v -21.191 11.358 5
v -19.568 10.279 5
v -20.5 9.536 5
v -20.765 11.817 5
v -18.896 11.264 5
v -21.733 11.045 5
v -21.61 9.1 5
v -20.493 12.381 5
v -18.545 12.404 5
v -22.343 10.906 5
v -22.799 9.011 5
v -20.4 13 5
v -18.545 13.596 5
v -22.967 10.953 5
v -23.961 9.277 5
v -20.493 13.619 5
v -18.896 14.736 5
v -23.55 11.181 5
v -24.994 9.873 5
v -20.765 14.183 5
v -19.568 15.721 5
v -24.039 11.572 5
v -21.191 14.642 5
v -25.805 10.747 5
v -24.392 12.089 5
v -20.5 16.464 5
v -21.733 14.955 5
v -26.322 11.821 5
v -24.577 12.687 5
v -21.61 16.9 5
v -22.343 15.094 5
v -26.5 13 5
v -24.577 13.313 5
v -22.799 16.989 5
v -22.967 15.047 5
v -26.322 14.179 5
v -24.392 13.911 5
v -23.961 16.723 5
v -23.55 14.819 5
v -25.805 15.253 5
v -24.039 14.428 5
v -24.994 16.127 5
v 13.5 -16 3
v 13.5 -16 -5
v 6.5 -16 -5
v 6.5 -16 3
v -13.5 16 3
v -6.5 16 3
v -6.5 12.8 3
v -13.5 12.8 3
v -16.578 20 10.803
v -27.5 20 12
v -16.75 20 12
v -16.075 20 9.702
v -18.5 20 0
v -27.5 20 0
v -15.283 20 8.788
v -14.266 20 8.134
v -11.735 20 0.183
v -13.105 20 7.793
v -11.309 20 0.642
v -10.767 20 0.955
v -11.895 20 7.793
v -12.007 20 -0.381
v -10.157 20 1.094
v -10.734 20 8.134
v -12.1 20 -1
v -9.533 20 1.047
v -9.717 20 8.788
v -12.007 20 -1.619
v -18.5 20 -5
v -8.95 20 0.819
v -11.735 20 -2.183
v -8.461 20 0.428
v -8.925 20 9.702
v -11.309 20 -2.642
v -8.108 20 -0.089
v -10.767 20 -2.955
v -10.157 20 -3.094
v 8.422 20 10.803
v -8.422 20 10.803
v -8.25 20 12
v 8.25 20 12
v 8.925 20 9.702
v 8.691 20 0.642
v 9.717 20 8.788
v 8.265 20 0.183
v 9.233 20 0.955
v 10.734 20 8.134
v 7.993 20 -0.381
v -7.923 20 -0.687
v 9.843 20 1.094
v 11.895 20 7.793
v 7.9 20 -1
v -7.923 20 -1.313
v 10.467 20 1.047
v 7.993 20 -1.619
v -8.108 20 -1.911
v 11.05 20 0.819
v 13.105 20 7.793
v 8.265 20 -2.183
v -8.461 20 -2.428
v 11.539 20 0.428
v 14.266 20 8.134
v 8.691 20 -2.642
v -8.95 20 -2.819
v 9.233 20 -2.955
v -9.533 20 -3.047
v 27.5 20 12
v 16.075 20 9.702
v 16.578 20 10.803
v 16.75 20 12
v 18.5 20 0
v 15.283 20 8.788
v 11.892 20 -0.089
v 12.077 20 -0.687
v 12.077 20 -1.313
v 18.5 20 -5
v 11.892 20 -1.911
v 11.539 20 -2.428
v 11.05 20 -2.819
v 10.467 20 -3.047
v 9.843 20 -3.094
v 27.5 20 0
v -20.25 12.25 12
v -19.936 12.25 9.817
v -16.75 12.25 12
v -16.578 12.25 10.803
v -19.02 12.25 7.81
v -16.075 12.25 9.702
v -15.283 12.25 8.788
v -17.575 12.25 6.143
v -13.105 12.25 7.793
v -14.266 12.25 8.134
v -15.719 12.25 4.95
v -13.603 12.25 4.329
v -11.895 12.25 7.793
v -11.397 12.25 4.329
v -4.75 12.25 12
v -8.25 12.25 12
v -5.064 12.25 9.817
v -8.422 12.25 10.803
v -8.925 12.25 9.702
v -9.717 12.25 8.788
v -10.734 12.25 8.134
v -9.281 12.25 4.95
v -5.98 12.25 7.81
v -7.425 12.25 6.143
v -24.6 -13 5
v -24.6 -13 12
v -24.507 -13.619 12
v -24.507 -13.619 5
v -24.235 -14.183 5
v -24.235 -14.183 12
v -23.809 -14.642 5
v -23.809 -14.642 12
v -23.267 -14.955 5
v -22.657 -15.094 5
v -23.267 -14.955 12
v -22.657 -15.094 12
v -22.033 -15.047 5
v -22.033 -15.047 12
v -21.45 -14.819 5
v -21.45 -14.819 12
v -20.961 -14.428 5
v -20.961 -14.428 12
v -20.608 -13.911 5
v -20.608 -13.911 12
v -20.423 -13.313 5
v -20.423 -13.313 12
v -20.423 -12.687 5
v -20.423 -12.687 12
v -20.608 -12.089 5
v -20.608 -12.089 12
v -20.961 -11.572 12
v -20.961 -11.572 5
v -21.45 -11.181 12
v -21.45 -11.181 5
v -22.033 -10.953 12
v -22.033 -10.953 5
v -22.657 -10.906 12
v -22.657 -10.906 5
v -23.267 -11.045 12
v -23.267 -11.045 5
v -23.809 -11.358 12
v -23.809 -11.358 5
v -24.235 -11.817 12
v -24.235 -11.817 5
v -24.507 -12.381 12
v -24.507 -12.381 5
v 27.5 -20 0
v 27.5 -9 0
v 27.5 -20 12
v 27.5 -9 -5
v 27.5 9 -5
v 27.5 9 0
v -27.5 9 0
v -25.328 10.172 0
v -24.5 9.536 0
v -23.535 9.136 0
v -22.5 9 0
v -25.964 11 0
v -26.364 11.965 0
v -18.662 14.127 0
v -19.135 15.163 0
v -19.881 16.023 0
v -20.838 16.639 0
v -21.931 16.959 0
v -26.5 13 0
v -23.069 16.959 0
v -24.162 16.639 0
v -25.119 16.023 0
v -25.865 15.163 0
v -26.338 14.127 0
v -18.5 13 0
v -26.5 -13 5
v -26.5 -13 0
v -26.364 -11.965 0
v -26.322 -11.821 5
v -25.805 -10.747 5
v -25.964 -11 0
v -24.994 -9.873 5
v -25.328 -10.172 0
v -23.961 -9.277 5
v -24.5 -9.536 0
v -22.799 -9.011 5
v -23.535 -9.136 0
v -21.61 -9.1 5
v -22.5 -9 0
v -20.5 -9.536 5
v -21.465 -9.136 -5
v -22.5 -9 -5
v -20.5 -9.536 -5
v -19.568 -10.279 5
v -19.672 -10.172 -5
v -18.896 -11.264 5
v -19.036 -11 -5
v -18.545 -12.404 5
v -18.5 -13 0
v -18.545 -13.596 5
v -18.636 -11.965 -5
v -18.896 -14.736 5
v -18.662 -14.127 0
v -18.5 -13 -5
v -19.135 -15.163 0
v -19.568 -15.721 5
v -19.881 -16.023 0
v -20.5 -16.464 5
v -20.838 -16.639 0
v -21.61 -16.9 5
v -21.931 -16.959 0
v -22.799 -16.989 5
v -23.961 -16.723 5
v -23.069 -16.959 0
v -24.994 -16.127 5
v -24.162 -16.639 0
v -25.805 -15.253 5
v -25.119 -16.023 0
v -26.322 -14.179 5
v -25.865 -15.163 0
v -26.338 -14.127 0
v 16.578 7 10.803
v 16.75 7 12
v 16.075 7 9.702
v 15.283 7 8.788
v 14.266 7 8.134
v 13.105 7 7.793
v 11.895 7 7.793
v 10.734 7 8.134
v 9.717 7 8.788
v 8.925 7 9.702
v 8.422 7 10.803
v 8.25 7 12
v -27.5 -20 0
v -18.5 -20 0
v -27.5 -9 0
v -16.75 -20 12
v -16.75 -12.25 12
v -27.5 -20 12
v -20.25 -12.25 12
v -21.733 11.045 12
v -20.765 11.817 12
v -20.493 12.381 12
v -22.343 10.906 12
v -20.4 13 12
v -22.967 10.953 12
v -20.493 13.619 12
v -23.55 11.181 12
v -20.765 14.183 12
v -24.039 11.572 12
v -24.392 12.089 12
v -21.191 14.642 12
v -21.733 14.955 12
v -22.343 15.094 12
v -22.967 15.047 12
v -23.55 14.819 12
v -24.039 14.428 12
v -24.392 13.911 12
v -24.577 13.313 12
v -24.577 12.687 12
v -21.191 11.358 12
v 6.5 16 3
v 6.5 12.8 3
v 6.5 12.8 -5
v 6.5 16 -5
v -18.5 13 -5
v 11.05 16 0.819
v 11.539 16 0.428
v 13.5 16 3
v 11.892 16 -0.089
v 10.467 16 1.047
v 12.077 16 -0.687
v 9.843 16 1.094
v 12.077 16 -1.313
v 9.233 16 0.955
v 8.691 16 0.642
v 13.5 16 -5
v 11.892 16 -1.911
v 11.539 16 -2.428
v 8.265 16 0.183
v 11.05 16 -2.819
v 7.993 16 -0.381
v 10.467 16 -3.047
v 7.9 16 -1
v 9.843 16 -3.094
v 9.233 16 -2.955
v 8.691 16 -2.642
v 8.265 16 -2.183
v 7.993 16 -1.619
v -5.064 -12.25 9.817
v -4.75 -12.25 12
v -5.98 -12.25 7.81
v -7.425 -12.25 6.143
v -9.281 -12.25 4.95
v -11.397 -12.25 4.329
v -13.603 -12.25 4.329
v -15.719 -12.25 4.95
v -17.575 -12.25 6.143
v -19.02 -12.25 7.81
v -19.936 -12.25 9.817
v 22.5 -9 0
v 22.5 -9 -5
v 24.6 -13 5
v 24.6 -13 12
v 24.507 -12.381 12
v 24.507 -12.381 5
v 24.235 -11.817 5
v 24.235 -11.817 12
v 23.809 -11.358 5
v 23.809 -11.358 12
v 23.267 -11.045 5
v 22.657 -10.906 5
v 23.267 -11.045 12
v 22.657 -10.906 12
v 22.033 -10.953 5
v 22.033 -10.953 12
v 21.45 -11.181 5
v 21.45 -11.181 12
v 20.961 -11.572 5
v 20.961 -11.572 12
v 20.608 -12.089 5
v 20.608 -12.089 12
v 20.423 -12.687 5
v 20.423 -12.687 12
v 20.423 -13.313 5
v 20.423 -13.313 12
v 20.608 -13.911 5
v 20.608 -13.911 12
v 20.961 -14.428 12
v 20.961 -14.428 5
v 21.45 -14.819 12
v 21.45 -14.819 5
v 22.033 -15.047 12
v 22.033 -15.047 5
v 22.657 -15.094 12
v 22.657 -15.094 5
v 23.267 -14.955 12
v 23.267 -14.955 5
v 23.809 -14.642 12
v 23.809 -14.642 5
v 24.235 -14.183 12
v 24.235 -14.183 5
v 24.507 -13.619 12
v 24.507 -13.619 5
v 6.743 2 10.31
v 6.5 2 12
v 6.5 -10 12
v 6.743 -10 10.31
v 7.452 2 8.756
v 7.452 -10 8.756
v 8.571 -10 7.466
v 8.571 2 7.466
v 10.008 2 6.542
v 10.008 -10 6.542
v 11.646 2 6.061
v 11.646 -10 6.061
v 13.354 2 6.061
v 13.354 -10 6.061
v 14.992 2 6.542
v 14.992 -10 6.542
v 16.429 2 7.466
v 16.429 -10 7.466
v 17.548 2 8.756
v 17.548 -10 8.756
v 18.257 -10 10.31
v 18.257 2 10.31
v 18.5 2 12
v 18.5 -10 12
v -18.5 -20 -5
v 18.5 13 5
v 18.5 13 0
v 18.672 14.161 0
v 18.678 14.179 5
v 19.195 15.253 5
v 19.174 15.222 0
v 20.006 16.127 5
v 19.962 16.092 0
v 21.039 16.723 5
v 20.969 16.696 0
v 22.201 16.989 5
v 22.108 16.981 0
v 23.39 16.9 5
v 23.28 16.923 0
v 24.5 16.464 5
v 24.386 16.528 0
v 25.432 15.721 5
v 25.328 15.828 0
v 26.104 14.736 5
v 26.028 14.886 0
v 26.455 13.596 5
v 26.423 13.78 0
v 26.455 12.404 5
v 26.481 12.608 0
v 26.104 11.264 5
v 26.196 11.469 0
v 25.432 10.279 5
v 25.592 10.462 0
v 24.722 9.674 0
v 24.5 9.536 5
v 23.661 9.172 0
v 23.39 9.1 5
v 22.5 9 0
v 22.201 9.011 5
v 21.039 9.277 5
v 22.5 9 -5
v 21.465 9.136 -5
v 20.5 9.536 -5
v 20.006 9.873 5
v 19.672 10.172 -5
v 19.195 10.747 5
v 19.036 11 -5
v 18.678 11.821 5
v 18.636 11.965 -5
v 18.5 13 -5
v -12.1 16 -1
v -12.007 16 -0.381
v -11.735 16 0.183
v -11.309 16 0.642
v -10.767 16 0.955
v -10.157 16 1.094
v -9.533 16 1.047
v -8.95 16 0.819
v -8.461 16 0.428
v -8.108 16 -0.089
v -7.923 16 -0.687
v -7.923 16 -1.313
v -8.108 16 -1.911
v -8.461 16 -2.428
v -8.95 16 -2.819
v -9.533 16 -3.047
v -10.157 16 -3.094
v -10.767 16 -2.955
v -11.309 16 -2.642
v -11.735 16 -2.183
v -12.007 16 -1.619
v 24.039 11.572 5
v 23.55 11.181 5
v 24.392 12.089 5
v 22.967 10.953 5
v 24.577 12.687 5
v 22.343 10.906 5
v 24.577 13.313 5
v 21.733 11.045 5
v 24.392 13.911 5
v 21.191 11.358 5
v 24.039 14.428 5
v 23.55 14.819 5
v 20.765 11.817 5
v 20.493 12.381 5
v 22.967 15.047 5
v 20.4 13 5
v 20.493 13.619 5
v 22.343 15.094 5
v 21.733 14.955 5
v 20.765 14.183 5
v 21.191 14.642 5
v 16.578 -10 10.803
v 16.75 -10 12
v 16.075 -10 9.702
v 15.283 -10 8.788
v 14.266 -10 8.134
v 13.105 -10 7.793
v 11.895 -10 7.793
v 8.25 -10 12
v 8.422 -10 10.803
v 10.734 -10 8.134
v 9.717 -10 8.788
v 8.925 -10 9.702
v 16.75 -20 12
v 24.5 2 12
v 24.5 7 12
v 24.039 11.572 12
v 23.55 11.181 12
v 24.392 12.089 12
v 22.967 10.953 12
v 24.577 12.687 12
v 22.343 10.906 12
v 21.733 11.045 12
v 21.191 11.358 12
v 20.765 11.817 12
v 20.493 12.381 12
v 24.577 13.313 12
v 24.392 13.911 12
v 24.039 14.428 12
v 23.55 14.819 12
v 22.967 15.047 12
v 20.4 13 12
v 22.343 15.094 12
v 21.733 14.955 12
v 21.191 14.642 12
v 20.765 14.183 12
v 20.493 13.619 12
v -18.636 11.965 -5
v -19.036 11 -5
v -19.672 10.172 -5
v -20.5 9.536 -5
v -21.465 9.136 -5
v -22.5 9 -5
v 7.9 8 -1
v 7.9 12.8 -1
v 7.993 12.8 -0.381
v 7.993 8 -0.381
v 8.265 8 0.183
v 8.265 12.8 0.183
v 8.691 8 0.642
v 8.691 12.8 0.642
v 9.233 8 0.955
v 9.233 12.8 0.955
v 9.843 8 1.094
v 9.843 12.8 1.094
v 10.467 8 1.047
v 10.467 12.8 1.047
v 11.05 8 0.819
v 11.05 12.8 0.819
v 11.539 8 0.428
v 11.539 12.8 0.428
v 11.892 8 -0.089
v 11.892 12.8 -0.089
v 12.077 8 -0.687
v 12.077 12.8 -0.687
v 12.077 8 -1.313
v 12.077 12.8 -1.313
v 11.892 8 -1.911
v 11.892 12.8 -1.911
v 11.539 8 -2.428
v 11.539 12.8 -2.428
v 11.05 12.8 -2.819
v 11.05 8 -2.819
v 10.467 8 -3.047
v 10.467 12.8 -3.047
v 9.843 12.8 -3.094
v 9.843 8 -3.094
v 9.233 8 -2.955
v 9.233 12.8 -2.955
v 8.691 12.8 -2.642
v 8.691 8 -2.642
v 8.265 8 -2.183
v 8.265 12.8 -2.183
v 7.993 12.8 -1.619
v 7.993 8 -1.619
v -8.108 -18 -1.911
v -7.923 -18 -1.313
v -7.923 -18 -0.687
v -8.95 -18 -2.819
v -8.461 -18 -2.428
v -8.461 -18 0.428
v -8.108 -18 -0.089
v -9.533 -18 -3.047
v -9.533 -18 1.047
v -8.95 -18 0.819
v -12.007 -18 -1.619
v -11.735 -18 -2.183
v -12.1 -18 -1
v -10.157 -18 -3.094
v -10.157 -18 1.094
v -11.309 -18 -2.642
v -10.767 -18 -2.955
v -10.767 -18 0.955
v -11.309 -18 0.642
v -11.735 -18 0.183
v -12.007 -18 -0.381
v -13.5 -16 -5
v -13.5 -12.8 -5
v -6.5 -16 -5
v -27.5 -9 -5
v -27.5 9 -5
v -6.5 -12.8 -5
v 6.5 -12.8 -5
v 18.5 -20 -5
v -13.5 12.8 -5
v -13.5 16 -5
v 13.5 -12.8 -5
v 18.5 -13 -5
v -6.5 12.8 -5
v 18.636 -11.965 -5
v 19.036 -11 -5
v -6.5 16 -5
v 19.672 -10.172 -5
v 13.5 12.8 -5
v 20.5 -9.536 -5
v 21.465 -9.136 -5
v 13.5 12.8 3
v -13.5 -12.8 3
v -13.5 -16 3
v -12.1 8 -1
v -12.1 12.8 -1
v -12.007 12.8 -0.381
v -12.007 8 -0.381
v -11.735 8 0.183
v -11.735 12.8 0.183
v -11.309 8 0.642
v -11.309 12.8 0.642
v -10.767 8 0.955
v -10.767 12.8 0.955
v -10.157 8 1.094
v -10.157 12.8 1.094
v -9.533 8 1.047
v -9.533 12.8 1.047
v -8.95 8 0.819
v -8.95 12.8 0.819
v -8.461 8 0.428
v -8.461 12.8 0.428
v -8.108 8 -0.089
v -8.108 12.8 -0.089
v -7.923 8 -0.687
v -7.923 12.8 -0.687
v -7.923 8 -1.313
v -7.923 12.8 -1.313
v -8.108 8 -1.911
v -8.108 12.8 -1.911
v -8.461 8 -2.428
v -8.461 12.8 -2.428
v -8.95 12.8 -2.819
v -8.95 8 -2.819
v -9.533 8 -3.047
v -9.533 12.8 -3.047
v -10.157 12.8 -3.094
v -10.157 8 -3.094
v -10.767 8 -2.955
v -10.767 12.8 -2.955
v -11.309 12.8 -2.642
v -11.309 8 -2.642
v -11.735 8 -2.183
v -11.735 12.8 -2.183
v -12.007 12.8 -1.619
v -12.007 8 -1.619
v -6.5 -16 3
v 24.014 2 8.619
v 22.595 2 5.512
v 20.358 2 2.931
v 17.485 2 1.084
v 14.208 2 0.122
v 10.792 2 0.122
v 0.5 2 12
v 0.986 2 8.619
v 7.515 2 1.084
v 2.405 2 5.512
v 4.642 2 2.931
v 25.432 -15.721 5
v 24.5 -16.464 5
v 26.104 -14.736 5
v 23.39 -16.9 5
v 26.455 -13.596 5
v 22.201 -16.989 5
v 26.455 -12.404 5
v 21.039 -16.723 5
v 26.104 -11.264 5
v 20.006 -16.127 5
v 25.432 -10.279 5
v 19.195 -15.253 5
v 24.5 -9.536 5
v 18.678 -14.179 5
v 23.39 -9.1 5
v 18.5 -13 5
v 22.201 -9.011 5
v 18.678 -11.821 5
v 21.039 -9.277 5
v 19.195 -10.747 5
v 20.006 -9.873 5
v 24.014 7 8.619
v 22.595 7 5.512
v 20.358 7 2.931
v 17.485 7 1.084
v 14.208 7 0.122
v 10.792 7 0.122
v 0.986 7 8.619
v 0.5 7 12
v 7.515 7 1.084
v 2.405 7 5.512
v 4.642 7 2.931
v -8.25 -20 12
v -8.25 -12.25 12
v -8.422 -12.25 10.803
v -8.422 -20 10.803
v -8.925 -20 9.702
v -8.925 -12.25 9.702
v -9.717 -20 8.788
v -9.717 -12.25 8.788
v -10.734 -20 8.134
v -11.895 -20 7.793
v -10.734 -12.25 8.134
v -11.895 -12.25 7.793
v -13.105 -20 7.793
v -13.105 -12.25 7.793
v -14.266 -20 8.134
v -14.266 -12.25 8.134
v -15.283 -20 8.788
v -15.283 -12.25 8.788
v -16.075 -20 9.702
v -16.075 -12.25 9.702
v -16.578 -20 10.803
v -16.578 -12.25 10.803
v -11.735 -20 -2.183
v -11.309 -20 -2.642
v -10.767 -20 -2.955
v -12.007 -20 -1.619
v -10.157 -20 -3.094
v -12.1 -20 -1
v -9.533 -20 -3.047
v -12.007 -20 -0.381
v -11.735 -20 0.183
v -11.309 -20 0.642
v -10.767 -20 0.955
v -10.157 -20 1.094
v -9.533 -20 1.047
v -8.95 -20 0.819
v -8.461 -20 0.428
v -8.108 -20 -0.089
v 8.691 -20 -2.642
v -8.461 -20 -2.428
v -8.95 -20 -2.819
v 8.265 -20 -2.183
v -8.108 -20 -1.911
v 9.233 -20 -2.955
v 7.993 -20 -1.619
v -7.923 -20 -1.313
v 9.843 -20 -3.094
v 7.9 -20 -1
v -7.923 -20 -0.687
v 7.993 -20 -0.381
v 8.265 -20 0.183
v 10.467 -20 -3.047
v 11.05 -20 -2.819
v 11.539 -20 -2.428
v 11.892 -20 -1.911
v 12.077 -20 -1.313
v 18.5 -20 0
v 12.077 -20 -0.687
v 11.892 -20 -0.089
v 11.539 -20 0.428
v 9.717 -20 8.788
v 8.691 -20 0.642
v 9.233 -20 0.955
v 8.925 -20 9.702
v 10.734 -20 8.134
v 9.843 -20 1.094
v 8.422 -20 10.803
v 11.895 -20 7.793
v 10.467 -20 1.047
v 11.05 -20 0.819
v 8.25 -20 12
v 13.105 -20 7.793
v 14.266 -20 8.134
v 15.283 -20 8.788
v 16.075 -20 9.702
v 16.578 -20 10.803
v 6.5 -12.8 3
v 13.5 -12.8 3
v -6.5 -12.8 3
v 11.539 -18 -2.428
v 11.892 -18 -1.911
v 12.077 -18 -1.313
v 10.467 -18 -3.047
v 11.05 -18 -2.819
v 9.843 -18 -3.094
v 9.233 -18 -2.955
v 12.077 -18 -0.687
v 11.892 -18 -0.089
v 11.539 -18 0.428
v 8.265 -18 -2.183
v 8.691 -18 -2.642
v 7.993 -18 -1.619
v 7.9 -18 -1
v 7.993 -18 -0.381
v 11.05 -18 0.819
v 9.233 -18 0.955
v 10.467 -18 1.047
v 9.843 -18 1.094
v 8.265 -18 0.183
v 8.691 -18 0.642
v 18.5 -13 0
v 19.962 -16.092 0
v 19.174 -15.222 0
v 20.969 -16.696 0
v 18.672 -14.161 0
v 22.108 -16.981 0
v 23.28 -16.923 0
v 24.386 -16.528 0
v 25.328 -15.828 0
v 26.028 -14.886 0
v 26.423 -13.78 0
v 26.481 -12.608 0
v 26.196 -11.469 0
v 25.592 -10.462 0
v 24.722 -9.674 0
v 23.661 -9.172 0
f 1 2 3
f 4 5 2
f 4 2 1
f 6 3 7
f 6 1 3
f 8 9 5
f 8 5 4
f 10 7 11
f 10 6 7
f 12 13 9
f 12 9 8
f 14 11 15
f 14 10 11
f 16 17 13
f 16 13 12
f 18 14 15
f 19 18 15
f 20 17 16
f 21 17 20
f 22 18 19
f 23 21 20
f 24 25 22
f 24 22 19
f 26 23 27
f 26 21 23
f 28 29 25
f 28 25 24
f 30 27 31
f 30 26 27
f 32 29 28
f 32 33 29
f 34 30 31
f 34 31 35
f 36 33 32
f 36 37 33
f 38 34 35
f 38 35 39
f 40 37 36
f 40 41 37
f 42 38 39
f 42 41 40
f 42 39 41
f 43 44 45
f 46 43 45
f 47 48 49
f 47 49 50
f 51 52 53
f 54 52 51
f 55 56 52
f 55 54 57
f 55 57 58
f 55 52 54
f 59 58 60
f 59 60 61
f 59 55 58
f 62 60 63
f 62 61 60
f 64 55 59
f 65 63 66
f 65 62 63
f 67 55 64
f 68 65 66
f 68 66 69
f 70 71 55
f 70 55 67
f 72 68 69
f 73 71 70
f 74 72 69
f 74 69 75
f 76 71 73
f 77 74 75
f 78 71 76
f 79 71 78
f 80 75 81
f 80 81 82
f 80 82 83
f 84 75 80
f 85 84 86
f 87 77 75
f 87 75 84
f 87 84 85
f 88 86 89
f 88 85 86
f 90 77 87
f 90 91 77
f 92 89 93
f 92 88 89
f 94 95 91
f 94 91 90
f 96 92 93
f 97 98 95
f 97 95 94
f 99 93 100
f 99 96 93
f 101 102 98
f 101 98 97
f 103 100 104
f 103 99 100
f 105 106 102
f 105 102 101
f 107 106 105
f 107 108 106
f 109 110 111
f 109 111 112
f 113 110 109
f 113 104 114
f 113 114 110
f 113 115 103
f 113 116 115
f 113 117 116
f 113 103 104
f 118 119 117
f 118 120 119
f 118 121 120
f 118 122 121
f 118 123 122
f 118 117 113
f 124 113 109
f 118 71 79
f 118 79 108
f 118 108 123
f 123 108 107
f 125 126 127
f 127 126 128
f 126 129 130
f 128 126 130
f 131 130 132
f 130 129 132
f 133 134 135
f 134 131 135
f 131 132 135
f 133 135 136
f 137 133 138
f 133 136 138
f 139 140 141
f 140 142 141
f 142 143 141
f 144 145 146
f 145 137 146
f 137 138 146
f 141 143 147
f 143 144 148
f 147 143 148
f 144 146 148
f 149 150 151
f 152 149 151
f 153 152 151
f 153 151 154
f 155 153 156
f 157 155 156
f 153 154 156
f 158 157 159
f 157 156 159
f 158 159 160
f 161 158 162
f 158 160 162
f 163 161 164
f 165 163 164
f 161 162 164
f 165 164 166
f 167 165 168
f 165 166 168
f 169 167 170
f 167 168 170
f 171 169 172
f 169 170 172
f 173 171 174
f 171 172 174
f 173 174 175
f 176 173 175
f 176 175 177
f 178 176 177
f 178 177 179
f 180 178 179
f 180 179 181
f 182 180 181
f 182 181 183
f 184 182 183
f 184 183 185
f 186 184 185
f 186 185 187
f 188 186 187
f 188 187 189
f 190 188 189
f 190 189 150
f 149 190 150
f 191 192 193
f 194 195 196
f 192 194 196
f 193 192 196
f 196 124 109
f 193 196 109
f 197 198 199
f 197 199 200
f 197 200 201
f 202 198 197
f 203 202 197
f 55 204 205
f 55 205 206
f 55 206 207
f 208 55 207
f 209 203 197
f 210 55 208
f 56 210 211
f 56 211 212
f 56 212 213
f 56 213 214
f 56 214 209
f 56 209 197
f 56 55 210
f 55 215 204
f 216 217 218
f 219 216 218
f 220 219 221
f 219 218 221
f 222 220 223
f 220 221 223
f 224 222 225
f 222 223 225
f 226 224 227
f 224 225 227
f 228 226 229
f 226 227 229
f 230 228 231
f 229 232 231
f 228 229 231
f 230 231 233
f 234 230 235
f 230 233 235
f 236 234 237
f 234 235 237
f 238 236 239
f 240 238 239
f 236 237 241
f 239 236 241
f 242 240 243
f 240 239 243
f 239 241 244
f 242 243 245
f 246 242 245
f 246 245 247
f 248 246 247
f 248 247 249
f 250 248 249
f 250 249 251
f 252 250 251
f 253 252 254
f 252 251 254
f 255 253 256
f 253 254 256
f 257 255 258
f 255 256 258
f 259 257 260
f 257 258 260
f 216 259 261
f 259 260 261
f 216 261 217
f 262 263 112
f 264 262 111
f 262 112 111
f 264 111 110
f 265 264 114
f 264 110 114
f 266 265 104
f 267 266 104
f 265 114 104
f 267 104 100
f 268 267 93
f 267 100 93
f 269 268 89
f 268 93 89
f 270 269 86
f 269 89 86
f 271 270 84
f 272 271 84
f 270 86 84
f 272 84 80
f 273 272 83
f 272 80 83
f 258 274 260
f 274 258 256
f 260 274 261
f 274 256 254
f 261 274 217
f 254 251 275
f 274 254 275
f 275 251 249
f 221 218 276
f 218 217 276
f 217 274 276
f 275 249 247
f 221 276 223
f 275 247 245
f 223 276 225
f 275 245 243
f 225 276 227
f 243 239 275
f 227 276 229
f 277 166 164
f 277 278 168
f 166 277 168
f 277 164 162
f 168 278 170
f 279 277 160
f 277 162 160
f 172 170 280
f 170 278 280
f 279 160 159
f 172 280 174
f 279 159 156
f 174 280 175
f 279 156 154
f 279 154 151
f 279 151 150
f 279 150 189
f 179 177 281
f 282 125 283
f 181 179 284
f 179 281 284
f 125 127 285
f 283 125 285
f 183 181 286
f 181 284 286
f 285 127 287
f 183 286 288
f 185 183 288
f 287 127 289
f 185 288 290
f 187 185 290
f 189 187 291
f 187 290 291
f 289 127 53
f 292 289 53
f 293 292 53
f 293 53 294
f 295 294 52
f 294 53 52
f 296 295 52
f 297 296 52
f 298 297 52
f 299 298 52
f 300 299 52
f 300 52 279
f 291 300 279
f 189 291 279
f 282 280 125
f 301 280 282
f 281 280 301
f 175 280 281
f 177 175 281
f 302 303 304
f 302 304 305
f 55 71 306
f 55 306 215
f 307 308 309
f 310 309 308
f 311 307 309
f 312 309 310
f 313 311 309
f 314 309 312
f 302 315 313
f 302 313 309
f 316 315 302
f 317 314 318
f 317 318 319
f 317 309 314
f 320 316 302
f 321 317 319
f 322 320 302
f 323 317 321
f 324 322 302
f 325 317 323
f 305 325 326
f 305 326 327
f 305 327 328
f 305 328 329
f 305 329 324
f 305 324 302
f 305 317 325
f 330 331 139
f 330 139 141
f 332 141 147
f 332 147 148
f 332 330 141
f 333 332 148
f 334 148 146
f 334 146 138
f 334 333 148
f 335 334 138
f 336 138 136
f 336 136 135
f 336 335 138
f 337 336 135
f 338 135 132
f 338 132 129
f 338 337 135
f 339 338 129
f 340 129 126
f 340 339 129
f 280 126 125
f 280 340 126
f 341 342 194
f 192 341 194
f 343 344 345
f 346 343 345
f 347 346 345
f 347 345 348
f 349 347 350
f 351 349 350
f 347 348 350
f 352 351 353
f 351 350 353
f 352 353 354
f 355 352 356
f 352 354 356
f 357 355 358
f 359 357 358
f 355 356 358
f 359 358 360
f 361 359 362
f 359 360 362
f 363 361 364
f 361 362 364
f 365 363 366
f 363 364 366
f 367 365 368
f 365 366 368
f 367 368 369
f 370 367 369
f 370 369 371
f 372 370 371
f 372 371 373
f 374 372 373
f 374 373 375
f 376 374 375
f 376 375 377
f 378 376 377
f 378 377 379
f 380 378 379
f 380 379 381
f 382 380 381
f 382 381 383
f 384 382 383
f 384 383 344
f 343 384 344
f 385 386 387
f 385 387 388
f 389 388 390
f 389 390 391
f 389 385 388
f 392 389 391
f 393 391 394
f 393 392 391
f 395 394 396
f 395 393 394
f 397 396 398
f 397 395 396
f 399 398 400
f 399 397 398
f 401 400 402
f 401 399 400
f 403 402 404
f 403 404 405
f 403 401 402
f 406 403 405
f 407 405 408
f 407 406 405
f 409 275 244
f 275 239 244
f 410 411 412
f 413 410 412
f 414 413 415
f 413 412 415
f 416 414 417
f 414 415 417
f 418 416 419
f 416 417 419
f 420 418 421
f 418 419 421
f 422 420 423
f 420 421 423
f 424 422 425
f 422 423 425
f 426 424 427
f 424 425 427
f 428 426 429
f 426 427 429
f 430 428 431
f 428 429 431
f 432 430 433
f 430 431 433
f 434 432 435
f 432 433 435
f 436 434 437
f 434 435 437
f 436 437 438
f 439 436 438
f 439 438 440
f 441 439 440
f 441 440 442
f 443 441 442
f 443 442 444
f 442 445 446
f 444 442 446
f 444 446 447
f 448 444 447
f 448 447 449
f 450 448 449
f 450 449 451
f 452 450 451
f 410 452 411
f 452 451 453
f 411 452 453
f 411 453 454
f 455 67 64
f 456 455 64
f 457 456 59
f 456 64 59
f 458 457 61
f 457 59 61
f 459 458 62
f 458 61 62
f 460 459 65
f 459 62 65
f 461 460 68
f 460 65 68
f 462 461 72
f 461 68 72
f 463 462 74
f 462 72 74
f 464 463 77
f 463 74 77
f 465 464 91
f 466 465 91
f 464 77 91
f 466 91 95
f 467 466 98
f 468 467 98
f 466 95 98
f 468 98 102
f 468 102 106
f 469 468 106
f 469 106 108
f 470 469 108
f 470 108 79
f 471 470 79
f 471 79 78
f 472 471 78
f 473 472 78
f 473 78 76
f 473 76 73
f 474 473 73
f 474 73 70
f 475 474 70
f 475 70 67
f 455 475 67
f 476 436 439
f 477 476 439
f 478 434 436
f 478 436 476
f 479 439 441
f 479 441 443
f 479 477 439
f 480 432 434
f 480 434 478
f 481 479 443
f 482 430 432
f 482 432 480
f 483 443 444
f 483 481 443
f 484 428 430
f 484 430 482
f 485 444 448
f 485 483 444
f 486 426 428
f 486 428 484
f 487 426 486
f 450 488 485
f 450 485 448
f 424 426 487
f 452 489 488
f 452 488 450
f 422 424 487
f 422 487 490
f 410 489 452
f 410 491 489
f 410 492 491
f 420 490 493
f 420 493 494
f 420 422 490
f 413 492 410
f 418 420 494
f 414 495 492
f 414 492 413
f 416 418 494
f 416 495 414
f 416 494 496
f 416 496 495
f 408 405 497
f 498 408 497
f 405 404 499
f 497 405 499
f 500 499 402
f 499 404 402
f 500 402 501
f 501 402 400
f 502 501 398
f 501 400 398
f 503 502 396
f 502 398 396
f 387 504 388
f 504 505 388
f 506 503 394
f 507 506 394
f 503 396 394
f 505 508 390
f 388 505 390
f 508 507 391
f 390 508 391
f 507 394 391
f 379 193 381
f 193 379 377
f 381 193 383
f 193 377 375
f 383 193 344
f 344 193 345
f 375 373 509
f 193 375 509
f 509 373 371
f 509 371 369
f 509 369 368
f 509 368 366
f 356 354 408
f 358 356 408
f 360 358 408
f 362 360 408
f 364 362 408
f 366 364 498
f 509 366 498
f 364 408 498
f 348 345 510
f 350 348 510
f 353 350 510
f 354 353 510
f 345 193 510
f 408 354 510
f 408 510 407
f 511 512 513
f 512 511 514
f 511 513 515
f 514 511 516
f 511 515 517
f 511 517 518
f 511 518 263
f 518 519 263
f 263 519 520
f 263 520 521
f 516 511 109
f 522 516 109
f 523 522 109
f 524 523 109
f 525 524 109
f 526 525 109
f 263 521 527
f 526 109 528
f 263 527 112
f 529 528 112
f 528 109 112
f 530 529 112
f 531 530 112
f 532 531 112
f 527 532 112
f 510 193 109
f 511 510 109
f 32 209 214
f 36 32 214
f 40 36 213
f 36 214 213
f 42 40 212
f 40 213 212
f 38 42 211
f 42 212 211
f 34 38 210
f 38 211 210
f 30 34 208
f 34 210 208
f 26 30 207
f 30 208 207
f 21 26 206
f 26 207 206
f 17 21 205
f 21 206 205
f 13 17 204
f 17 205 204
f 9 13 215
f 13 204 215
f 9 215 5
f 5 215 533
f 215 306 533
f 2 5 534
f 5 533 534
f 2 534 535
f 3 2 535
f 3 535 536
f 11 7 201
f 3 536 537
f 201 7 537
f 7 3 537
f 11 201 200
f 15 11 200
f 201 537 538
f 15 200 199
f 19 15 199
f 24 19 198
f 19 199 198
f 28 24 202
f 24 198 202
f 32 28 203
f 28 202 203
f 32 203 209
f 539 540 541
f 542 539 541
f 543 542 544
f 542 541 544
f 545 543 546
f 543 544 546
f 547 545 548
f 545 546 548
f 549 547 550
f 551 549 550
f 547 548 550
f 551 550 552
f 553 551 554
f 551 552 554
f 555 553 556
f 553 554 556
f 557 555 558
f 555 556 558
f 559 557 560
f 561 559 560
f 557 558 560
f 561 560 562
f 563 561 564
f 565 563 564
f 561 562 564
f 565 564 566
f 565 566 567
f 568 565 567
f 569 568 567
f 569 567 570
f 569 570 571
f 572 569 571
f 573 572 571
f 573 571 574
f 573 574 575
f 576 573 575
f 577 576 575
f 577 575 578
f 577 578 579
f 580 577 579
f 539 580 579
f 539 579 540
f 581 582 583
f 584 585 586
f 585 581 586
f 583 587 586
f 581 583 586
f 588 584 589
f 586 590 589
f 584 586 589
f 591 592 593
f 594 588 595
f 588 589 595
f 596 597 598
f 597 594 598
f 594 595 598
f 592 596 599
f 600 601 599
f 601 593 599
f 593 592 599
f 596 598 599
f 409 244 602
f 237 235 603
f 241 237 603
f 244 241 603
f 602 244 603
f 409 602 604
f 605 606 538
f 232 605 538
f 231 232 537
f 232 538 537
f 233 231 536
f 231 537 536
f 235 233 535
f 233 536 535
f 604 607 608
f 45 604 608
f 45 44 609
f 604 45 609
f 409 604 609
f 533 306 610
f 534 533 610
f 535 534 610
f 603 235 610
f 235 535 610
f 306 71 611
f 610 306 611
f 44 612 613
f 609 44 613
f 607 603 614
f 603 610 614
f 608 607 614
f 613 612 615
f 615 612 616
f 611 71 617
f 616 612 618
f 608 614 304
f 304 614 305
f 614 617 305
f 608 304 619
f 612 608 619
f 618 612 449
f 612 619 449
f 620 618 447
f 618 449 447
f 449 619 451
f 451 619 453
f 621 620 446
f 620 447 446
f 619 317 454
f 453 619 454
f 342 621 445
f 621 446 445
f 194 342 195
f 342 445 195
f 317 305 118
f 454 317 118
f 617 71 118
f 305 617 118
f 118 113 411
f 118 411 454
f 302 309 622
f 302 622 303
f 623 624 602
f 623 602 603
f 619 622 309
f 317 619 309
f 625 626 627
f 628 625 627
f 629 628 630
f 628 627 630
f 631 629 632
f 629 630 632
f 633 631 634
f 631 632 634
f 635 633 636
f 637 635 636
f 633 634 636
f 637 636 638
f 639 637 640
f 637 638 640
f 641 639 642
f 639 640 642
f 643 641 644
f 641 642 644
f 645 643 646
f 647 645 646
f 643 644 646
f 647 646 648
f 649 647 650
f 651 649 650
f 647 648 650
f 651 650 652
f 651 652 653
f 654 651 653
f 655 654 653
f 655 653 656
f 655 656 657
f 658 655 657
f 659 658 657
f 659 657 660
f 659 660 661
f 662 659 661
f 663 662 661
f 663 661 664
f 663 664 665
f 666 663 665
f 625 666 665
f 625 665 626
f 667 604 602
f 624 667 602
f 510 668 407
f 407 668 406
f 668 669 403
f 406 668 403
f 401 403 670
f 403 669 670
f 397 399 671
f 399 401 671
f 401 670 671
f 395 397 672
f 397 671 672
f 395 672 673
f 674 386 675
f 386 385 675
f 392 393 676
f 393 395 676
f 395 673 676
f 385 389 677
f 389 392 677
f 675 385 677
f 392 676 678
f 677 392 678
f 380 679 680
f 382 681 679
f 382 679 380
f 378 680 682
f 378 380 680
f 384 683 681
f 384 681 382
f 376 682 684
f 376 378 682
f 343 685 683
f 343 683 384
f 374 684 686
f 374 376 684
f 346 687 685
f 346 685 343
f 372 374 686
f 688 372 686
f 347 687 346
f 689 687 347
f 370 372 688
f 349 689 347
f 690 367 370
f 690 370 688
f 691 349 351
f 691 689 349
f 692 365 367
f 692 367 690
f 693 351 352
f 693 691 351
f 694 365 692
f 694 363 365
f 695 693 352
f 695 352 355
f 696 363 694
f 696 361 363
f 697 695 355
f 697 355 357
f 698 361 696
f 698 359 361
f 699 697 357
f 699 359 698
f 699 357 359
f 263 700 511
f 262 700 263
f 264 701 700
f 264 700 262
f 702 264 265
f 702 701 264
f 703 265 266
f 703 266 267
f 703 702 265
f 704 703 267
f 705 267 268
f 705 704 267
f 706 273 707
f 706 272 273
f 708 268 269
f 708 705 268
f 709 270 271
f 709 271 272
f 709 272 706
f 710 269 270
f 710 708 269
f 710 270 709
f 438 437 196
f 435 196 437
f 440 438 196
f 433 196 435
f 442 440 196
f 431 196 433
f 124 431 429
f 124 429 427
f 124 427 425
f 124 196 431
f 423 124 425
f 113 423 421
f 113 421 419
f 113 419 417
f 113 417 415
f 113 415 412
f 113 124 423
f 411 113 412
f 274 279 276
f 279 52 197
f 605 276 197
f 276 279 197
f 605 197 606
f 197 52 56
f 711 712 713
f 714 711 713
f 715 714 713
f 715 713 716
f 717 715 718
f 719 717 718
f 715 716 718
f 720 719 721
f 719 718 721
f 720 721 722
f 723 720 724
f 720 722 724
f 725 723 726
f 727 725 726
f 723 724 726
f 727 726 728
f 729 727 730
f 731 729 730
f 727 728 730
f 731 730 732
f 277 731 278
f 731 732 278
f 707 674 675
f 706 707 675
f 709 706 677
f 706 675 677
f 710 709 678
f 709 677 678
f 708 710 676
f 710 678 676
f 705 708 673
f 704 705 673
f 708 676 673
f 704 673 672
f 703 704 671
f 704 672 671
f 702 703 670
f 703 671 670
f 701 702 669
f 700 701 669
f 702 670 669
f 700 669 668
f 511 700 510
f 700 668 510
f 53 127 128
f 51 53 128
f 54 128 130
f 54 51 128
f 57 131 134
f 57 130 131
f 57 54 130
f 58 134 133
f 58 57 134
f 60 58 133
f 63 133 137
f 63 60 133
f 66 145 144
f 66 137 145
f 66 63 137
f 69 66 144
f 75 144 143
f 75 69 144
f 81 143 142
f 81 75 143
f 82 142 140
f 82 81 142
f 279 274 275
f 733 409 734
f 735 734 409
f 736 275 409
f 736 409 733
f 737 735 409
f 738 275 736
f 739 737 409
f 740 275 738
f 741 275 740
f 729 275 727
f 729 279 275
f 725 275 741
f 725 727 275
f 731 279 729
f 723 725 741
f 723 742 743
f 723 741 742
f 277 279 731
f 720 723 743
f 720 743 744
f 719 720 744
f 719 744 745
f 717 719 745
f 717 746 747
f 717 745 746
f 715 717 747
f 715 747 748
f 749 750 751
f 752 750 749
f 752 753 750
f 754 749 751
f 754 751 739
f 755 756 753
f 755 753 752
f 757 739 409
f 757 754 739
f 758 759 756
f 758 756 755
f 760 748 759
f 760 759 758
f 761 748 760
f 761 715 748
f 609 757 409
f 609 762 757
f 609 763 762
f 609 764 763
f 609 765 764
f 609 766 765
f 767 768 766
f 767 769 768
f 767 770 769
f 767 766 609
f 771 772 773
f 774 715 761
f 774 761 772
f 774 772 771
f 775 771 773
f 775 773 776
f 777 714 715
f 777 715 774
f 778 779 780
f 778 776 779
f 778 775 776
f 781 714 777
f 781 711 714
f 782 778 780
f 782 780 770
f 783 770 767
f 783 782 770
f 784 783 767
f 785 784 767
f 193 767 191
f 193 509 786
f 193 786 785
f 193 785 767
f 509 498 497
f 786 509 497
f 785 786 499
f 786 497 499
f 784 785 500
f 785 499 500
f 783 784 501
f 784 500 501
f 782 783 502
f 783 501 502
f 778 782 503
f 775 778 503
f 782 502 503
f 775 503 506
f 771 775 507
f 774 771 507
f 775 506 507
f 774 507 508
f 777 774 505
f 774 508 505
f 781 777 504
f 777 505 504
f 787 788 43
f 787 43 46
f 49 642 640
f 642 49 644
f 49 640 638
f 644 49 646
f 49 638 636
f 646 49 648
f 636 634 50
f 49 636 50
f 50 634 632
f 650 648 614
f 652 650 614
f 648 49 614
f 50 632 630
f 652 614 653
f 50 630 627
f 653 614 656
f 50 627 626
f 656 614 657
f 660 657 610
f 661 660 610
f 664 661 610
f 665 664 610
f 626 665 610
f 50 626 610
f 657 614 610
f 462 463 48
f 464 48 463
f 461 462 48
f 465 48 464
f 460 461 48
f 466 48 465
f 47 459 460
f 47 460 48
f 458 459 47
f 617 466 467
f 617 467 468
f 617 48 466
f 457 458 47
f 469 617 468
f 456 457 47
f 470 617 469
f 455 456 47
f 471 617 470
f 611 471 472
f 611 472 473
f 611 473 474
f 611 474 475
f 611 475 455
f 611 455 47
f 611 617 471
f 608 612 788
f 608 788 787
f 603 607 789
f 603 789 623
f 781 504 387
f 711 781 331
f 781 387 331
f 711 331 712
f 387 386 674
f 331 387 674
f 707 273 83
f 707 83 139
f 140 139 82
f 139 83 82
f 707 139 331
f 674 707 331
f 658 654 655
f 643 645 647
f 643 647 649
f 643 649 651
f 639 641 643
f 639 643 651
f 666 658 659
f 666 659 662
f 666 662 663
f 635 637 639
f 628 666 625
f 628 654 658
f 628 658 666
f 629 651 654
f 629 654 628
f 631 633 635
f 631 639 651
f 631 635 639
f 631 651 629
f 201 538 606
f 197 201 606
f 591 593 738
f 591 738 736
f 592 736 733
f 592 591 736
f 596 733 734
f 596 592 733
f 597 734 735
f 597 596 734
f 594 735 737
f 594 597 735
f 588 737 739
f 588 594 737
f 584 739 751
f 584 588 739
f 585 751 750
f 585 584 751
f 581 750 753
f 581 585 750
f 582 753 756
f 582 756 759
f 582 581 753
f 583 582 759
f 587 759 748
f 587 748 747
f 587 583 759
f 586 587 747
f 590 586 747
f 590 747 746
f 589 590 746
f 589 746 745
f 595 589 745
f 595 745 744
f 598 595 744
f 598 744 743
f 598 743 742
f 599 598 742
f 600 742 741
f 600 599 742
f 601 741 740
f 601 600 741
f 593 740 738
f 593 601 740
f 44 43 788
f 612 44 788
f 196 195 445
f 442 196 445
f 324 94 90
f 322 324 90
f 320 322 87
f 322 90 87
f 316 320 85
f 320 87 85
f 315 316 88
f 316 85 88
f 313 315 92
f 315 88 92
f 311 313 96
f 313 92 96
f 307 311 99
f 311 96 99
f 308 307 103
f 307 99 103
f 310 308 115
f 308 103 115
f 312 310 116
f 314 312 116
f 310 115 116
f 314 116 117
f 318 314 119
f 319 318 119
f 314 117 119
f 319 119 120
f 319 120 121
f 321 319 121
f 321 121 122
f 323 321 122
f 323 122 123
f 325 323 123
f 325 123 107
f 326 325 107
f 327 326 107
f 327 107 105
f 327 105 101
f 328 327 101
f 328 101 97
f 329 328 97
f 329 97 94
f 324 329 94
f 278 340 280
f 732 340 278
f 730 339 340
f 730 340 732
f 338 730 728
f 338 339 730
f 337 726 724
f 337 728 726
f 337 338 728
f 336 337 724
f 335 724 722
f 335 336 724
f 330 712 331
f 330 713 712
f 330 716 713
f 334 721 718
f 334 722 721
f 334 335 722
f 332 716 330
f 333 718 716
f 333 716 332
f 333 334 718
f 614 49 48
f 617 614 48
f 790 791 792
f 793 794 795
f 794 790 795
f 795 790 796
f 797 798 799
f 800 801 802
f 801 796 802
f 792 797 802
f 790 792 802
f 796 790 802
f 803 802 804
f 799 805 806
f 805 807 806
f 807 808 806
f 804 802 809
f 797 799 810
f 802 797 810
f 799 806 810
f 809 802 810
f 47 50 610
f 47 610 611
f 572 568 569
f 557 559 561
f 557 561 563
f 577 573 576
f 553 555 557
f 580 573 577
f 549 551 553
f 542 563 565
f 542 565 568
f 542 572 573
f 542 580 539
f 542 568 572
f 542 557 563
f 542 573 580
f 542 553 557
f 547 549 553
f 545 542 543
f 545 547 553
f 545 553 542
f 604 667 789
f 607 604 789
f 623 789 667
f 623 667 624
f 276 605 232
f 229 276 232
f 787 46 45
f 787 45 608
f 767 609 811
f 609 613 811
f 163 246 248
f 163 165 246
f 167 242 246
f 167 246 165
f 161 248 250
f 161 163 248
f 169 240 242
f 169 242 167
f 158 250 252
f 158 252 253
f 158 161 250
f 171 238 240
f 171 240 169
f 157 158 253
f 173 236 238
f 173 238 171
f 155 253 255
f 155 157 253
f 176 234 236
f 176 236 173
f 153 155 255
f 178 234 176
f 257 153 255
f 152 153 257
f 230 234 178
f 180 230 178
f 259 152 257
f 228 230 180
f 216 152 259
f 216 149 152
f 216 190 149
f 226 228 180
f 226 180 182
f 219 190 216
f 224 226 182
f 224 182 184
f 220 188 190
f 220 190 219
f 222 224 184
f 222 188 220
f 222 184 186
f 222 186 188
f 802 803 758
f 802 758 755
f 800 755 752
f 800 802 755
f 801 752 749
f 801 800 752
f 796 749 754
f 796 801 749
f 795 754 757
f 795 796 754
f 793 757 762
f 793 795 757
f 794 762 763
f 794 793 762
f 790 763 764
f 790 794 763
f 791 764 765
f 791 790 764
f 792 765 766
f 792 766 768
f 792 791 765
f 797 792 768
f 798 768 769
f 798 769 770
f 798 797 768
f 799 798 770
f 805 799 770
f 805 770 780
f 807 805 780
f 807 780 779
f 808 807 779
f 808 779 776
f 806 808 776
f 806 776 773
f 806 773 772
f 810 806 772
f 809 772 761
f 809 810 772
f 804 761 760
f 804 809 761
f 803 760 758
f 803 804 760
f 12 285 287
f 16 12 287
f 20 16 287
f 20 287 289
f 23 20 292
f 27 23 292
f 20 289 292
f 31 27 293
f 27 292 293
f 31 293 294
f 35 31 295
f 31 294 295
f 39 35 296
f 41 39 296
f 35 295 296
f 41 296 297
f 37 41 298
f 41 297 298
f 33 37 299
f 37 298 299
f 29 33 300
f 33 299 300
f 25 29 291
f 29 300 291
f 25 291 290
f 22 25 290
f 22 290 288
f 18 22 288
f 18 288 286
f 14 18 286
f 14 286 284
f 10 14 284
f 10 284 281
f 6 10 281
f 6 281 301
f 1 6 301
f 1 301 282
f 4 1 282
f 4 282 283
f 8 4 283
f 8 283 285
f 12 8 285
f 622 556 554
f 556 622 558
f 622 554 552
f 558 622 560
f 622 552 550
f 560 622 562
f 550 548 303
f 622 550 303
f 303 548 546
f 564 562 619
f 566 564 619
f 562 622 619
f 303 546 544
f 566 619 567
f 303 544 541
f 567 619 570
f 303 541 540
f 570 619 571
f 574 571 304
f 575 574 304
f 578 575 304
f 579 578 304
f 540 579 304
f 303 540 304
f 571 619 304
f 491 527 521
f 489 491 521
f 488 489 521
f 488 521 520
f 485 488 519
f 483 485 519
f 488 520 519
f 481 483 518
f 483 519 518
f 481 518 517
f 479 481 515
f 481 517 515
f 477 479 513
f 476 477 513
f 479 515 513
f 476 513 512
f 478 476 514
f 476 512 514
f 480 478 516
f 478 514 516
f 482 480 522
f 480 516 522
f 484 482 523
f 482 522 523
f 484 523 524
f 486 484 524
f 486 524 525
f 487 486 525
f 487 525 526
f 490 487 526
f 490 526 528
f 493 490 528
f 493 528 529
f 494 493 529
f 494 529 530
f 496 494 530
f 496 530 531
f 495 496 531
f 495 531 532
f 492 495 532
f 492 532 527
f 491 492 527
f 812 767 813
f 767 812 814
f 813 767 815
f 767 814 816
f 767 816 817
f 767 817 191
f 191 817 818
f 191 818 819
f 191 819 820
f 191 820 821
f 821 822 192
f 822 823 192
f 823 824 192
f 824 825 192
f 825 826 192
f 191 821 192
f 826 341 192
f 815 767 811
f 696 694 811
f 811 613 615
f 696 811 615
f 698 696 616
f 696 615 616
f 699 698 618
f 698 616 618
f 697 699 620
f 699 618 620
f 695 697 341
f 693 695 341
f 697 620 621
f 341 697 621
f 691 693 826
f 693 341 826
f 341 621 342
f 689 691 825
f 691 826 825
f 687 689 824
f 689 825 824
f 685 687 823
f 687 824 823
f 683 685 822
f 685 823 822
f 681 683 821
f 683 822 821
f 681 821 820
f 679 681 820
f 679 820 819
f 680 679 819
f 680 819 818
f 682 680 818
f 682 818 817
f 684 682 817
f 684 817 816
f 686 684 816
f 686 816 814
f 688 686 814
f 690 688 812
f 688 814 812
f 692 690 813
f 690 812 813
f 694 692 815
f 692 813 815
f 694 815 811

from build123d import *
from build123d.topology import SkipClean

# Parameters (mm, degrees)
ESQUISSE1_W                  = 55
ESQUISSE1_H                  = 45
BOSS_EXTRU_1_DEPTH           = 12
ESQUISSE2_R                  = 4.25
ENL_V_MAT_EXTRU_1_DEPTH      = 55.085580333
ENL_V_MAT_EXTRU_2_DEPTH      = 12.25
ENL_V_MAT_EXTRU_2_DEPTH_BACK = 12.25
ESQUISSE3_R                  = 7.75
ESQUISSE9_W                  = 61.062756781
ESQUISSE9_H                  = 12.22812859
ESQUISSE9_W_2                = 59.427147224
ESQUISSE9_H_2                = 8.100161614
ENL_V_MAT_EXTRU_7_DEPTH      = 31
SKETCH1_W                    = 55
SKETCH1_H                    = 36
BOSS_EXTRUDE1_DEPTH          = 5
SKETCH2_R                    = 2.1
CUT_EXTRUDE1_DEPTH           = 38.003378224
SKETCH3_R                    = 4
CUT_EXTRUDE2_DEPTH           = 10
CUT_EXTRUDE3_DEPTH           = 5
SKETCH5_R                    = 2.1
CUT_EXTRUDE4_DEPTH           = 10
BOSS_EXTRUDE4_START          = 2
SKETCH7_R                    = 2.1
BOSS_EXTRUDE4_DEPTH          = 2
SKETCH8_R                    = 2.1
BOSS_EXTRUDE5_DEPTH          = 2
SKETCH9_W                    = 7
SKETCH9_H                    = 3.2
CUT_EXTRUDE6_DEPTH           = 8
ESQUISSE12_R                 = 6
ENL_V_MAT_EXTRU_9_DEPTH      = 12
ESQUISSE13_R                 = 12
ENL_V_MAT_EXTRU_10_DEPTH     = 5


with BuildPart() as part:
    # Esquisse1 → Boss.-Extru.1 (new body)
    with BuildSketch(Plane.XY):
        Rectangle(ESQUISSE1_W, ESQUISSE1_H)
    extrude(amount=BOSS_EXTRU_1_DEPTH)

    # Esquisse2 → Enlèv. mat.-Extru.1 (cut, through all)
    with BuildSketch(Plane(origin=(0, 22.5, 0), x_dir=(1, 0, 0), z_dir=(0, 1, 0))):
        with Locations((-12.5, -12)):
            Circle(ESQUISSE2_R)
        with Locations((12.5, -12)):
            Circle(ESQUISSE2_R)
    extrude(amount=-ENL_V_MAT_EXTRU_1_DEPTH, mode=Mode.SUBTRACT)

    # Esquisse3 → Enlèv. mat.-Extru.2 (cut, two sides: drawn at the far end of the back side and taken through both)
    with BuildSketch(Plane(origin=(0, 0, 0), x_dir=(1, 0, 0), z_dir=(0, 1, 0)).offset(-ENL_V_MAT_EXTRU_2_DEPTH_BACK)):
        with Locations((-12.5, -12)):
            Circle(ESQUISSE3_R)
    extrude(amount=ENL_V_MAT_EXTRU_2_DEPTH + ENL_V_MAT_EXTRU_2_DEPTH_BACK, mode=Mode.SUBTRACT)

    # Esquisse9 → Enlèv. mat.-Extru.7 (cut)
    with BuildSketch(Plane.XY.offset(12)):
        with Locations((-0.389430846, -24.114064295)):
            Rectangle(ESQUISSE9_W, ESQUISSE9_H)
        with Locations((1.674552641, 22.050080807)):
            Rectangle(ESQUISSE9_W_2, ESQUISSE9_H_2)
    extrude(amount=-ENL_V_MAT_EXTRU_7_DEPTH, mode=Mode.SUBTRACT)

    # Sketch1 → Boss-Extrude1 (add)
    with BuildSketch(Plane(origin=(0, 0, 0), x_dir=(-1, 0, 0), z_dir=(0, 0, -1))):
        Rectangle(SKETCH1_W, SKETCH1_H)
    extrude(amount=BOSS_EXTRUDE1_DEPTH)

    # Sketch2 → Cut-Extrude1 (cut, through all)
    with BuildSketch(Plane.XY.offset(12)):
        with Locations((-22.5, 13)):
            Circle(SKETCH2_R)
        with Locations((22.5, 13)):
            Circle(SKETCH2_R)
        with Locations((22.5, -13)):
            Circle(SKETCH2_R)
        with Locations((-22.5, -13)):
            Circle(SKETCH2_R)
    extrude(amount=-CUT_EXTRUDE1_DEPTH, mode=Mode.SUBTRACT)

    # Sketch3 → Cut-Extrude2 (cut)
    with BuildSketch(Plane(origin=(0, 0, -5), x_dir=(-1, 0, 0), z_dir=(0, 0, -1))):
        with Locations((-22.5, 13)):
            Circle(SKETCH3_R)
        with Locations((22.5, 13)):
            Circle(SKETCH3_R)
        with Locations((22.5, -13)):
            Circle(SKETCH3_R)
        with Locations((-22.5, -13)):
            Circle(SKETCH3_R)
    extrude(amount=-CUT_EXTRUDE2_DEPTH, mode=Mode.SUBTRACT)

    # Sketch4 → Cut-Extrude3 (cut)
    with BuildSketch(Plane(origin=(0, 0, -5), x_dir=(-1, 0, 0), z_dir=(0, 0, -1))):
        with BuildLine():
            Line((-18.5, 13), (-18.5, 18))
            Line((-18.5, 18), (-27.5, 18))
            Line((-27.5, 18), (-27.5, 9))
            Line((-27.5, 9), (-22.5, 9))
            ThreePointArc((-22.5, 9), (-25.328427125, 15.828427125), (-18.5, 13))
        make_face()
        with BuildLine():
            Line((-22.5, -9), (-27.5, -9))
            Line((-27.5, -9), (-27.5, -18))
            Line((-27.5, -18), (-18.5, -18))
            Line((-18.5, -18), (-18.5, -13))
            ThreePointArc((-18.5, -13), (-25.328427125, -15.828427125), (-22.5, -9))
        make_face()
        with BuildLine():
            Line((27.5, -18), (27.5, -9))
            Line((27.5, -9), (22.5, -9))
            ThreePointArc((22.5, -9), (25.328427125, -15.828427125), (18.5, -13))
            Line((18.5, -13), (18.5, -18))
            Line((18.5, -18), (27.5, -18))
        make_face()
        with BuildLine():
            Line((27.5, 18), (18.5, 18))
            Line((18.5, 18), (18.5, 13))
            ThreePointArc((18.5, 13), (25.328427125, 15.828427125), (22.5, 9))
            Line((22.5, 9), (27.5, 9))
            Line((27.5, 9), (27.5, 18))
        make_face()
    extrude(amount=-CUT_EXTRUDE3_DEPTH, mode=Mode.SUBTRACT)

    # Sketch5 → Cut-Extrude4 (cut)
    with BuildSketch(Plane(origin=(0, 18, 0), x_dir=(1, 0, 0), z_dir=(0, 1, 0))):
        with Locations((-10, 1)):
            Circle(SKETCH5_R)
        with Locations((10, 1)):
            Circle(SKETCH5_R)
    extrude(amount=-CUT_EXTRUDE4_DEPTH, mode=Mode.SUBTRACT)

    # Sketch7 → Boss-Extrude4 (add)
    with SkipClean():  # the faces are left unmerged after this step: merging them gives an invalid solid
        with BuildSketch(Plane(origin=(0, 18, 0), x_dir=(1, 0, 0), z_dir=(0, 1, 0)).offset(BOSS_EXTRUDE4_START)):
            with BuildLine():
                Line((18.5, 5), (-18.5, 5))
                Line((-18.5, 5), (-18.5, 0))
                Line((-18.5, 0), (-27.5, 0))
                Line((-27.5, 0), (-27.5, -12))
                Line((-27.5, -12), (-16.75, -12))
                ThreePointArc((-16.75, -12), (-12.5, -7.75), (-8.25, -12))
                Line((-8.25, -12), (8.25, -12))
                ThreePointArc((8.25, -12), (12.5, -7.75), (16.75, -12))
                Line((16.75, -12), (27.5, -12))
                Line((27.5, -12), (27.5, 0))
                Line((27.5, 0), (18.5, 0))
                Line((18.5, 0), (18.5, 5))
            make_face()
            with Locations((10, 1)):
                Circle(SKETCH7_R, mode=Mode.SUBTRACT)
            with Locations((-10, 1)):
                Circle(SKETCH7_R, mode=Mode.SUBTRACT)
        extrude(amount=-BOSS_EXTRUDE4_DEPTH)
    add(part.part.scale(1), mode=Mode.REPLACE)  # the faces are merged on a copy

    # Sketch8 → Boss-Extrude5 (add)
    with BuildSketch(Plane.XZ.offset(18)):
        with BuildLine():
            Line((-27.5, 0), (-18.5, 0))
            Line((-18.5, 0), (-18.5, -5))
            Line((-18.5, -5), (18.5, -5))
            Line((18.5, -5), (18.5, 0))
            Line((18.5, 0), (27.5, 0))
            Line((27.5, 0), (27.5, 12))
            Line((27.5, 12), (16.75, 12))
            ThreePointArc((16.75, 12), (12.5, 7.75), (8.25, 12))
            Line((8.25, 12), (-8.25, 12))
            ThreePointArc((-8.25, 12), (-12.5, 7.75), (-16.75, 12))
            Line((-16.75, 12), (-27.5, 12))
            Line((-27.5, 12), (-27.5, 0))
        make_face()
        with Locations((10, -1)):
            Circle(SKETCH8_R, mode=Mode.SUBTRACT)
        with Locations((-10, -1)):
            Circle(SKETCH8_R, mode=Mode.SUBTRACT)
    extrude(amount=BOSS_EXTRUDE5_DEPTH)

    # Sketch9 → Cut-Extrude6 (cut)
    with BuildSketch(Plane(origin=(0, 0, -5), x_dir=(-1, 0, 0), z_dir=(0, 0, -1))):
        with Locations((-10, 14.4)):
            Rectangle(SKETCH9_W, SKETCH9_H)
        with Locations((10, 14.4)):
            Rectangle(SKETCH9_W, SKETCH9_H)
        with Locations((10, -14.4)):
            Rectangle(SKETCH9_W, SKETCH9_H)
        with Locations((-10, -14.4)):
            Rectangle(SKETCH9_W, SKETCH9_H)
    extrude(amount=-CUT_EXTRUDE6_DEPTH, mode=Mode.SUBTRACT)

    # Esquisse12 → Enlèv. mat.-Extru.9 (cut)
    with BuildSketch(Plane(origin=(0, 2, 0), x_dir=(-1, 0, 0), z_dir=(0, -1, 0))):
        with Locations((-12.5, -12)):
            Circle(ESQUISSE12_R)
    extrude(amount=ENL_V_MAT_EXTRU_9_DEPTH, mode=Mode.SUBTRACT)

    # Esquisse13 → Enlèv. mat.-Extru.10 (cut)
    with BuildSketch(Plane(origin=(0, 2, 0), x_dir=(-1, 0, 0), z_dir=(0, -1, 0))):
        with Locations((-12.5, -12)):
            Circle(ESQUISSE13_R)
    extrude(amount=-ENL_V_MAT_EXTRU_10_DEPTH, mode=Mode.SUBTRACT)


solid = part.part
